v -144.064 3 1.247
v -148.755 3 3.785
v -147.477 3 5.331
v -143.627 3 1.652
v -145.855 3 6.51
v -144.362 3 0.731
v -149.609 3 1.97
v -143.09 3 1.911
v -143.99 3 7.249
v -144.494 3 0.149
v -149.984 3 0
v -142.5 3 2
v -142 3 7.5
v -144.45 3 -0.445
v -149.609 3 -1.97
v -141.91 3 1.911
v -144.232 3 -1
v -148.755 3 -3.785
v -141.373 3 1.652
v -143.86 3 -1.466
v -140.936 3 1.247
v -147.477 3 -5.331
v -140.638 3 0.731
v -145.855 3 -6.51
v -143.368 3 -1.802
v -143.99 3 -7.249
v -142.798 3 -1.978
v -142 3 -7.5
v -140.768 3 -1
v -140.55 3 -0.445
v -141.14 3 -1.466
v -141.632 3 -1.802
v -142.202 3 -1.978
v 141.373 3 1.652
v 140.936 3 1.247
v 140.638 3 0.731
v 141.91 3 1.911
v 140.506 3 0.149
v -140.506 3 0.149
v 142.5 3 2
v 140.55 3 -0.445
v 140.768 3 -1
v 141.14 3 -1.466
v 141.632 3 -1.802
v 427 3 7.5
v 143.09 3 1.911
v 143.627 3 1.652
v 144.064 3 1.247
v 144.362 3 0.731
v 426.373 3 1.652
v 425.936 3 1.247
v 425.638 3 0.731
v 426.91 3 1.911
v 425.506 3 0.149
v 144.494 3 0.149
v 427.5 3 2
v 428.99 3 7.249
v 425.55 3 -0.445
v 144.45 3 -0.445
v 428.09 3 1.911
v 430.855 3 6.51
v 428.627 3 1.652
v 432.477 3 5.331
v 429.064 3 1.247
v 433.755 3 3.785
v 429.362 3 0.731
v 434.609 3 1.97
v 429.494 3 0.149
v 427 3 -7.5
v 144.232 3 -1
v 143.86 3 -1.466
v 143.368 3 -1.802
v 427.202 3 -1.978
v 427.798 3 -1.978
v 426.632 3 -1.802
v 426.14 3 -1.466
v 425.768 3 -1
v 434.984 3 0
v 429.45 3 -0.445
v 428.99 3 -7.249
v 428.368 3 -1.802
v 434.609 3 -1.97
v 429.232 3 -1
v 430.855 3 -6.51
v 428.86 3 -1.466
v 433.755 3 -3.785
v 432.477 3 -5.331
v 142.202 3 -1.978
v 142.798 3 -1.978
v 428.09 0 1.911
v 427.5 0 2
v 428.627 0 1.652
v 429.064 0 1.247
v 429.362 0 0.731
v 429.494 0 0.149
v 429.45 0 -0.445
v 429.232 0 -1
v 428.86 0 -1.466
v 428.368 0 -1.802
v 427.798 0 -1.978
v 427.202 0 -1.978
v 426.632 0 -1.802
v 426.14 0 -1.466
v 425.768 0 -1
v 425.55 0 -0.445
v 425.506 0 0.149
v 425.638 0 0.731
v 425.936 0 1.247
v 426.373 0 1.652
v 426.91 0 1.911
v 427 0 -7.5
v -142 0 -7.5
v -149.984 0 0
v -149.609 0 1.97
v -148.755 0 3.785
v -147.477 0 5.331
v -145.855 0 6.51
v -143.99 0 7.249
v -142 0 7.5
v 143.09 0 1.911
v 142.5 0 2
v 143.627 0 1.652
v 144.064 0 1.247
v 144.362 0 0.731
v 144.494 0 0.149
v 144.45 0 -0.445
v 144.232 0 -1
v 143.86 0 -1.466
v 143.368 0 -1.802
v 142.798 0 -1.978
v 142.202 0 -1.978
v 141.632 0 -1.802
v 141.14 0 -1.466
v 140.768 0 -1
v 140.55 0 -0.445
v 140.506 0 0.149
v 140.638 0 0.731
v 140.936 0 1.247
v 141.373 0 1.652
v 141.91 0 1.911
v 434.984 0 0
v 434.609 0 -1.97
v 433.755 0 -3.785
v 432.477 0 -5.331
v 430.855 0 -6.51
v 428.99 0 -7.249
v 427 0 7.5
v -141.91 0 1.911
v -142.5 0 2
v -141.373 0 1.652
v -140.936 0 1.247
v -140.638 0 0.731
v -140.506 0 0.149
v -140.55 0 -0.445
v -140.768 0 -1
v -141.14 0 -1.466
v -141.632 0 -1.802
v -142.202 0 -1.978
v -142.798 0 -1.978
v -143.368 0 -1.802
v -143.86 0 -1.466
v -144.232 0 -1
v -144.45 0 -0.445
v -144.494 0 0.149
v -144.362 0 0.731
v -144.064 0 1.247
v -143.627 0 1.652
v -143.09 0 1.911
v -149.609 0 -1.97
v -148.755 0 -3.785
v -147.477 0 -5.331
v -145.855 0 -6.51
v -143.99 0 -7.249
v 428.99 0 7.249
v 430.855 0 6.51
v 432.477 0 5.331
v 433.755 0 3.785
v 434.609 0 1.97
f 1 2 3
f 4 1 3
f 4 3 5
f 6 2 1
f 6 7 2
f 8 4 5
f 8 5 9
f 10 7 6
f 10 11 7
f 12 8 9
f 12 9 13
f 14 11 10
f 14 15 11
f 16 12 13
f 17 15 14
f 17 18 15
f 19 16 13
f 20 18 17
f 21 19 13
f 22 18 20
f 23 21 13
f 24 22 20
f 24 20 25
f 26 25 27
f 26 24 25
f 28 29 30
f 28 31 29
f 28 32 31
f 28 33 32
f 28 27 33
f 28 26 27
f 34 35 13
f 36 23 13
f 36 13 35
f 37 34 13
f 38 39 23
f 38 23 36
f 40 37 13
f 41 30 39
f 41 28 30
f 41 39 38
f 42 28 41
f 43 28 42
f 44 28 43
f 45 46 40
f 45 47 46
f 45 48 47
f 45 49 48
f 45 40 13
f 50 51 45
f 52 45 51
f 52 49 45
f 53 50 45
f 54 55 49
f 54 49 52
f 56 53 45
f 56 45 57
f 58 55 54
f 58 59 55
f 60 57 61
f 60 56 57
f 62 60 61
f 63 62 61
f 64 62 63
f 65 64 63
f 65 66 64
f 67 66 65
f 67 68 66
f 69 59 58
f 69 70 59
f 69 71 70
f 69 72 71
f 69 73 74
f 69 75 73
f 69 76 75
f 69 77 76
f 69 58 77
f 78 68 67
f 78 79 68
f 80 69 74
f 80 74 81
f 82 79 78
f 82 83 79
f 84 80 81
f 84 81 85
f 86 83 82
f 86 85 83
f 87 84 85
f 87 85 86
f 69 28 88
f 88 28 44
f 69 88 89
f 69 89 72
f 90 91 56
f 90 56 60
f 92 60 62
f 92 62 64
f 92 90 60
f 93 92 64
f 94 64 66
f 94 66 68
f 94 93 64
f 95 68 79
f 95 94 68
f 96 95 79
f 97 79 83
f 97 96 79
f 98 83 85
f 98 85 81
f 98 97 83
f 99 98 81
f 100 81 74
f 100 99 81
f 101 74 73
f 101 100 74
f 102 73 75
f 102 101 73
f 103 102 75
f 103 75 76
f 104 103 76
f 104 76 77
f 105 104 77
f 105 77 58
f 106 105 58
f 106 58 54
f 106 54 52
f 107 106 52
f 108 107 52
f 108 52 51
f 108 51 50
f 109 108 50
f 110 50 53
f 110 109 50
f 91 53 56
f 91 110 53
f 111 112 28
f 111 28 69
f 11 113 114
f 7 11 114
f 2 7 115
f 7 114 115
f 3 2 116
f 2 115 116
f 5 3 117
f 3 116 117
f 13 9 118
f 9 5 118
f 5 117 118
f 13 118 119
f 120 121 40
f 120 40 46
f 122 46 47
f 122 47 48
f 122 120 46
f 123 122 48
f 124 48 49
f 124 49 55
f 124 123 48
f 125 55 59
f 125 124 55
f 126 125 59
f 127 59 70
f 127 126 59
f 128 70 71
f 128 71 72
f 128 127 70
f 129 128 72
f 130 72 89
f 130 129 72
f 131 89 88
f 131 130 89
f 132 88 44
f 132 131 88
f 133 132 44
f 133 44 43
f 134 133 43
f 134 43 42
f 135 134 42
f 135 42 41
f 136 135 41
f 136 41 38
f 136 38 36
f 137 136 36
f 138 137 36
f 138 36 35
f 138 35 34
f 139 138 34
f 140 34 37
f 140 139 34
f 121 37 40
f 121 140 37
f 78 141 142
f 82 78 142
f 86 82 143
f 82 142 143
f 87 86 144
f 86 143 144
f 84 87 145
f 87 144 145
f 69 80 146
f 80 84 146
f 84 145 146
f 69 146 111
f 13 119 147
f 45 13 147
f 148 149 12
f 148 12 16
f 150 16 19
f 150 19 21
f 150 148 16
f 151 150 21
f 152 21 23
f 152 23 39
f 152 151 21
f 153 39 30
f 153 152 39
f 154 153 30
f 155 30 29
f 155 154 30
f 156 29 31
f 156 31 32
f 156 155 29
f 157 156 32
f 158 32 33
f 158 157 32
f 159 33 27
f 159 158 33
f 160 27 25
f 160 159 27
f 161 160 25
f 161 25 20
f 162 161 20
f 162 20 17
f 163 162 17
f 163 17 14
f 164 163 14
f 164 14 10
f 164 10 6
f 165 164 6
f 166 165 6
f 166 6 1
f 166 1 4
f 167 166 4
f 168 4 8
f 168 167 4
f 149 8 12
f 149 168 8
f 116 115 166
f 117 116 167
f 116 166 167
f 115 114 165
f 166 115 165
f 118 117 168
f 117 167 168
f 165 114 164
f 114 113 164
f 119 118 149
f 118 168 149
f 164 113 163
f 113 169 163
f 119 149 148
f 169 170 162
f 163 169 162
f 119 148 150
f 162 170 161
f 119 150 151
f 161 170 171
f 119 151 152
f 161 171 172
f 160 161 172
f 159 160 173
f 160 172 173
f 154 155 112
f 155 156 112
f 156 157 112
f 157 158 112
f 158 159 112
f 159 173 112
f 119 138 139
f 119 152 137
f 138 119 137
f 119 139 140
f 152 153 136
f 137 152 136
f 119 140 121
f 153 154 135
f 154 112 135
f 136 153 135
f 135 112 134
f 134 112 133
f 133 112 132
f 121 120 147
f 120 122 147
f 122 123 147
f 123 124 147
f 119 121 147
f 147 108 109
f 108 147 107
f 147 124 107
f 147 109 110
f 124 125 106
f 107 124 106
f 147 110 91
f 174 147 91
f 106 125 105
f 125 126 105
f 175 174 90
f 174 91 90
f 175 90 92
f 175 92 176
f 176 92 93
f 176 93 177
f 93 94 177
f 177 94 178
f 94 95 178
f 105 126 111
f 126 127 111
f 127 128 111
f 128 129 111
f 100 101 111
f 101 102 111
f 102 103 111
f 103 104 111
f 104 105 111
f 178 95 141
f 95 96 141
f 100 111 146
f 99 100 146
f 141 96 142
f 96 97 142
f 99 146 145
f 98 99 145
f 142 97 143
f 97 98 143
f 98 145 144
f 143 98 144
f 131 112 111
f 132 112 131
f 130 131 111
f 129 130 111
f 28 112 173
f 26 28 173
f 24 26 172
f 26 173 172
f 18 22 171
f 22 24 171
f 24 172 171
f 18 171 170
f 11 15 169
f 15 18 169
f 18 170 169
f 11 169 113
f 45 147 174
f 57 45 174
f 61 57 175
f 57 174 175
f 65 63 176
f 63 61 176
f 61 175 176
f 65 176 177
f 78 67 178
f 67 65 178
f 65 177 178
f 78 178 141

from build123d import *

# Parameters (mm, degrees)
SKETCH1_W           = 285
SKETCH1_H           = 15
SKETCH1_R           = 2
SKETCH1_W_2         = 15
BOSS_EXTRUDE1_DEPTH = 3
FILLET1_R           = 8


with BuildPart() as part:
    # Sketch1 → Boss-Extrude1 (new body)
    # profile 1 of 3: a face of its own
    with BuildSketch(Plane(origin=(0, 0, 0), x_dir=(1, 0, 0), z_dir=(0, 1, 0))):
        with Locations((-7.5, 0)):
            Rectangle(SKETCH1_W, SKETCH1_H)
        with Locations(Location((-142.5, 0, 0), (0, 0, 270))):
            Circle(SKETCH1_R, mode=Mode.SUBTRACT)
    # profile 2 of 3: a face of its own
    with BuildSketch(Plane(origin=(0, 0, 0), x_dir=(1, 0, 0), z_dir=(0, 1, 0))):
        with Locations((292.5, 0)):
            Rectangle(SKETCH1_W, SKETCH1_H)
        with Locations(Location((427.5, 0, 0), (0, 0, 270))):
            Circle(SKETCH1_R, mode=Mode.SUBTRACT)
    # profile 3 of 3: a face of its own
    with BuildSketch(Plane(origin=(0, 0, 0), x_dir=(1, 0, 0), z_dir=(0, 1, 0))):
        with Locations((142.5, 0)):
            Rectangle(SKETCH1_W_2, SKETCH1_H)
        with Locations(Location((142.5, 0, 0), (0, 0, 270))):
            Circle(SKETCH1_R, mode=Mode.SUBTRACT)
    extrude(amount=BOSS_EXTRUDE1_DEPTH)

    # Fillet1
    # the kernel refuses this fillet: 8 mm, written as the material it takes off along each edge
    with BuildSketch(Plane(origin=(-150, -20, 7.5), x_dir=(1, 0, 0), z_dir=(0, 1, 0)), Plane(origin=(435, -20, -7.5), x_dir=(-1, 0, 0), z_dir=(0, 1, 0))) as fillet1_piece_1:
        with BuildLine():
            CenterArc((FILLET1_R, FILLET1_R), FILLET1_R, 180, 90)
            Line((0, FILLET1_R), (0, 0))
            Line((0, 0), (FILLET1_R, 0))
        make_face()
    extrude(amount=43, mode=Mode.SUBTRACT)
    with BuildSketch(Plane(origin=(-150, -20, -7.5), x_dir=(1, 0, 0), z_dir=(0, 1, 0)), Plane(origin=(435, -20, 7.5), x_dir=(-1, 0, 0), z_dir=(0, 1, 0))) as fillet1_piece_2:
        with BuildLine():
            CenterArc((FILLET1_R, -FILLET1_R), FILLET1_R, 90, 90)
            Line((0, -FILLET1_R), (0, 0))
            Line((0, 0), (FILLET1_R, 0))
        make_face()
    extrude(amount=43, mode=Mode.SUBTRACT)


solid = part.part
